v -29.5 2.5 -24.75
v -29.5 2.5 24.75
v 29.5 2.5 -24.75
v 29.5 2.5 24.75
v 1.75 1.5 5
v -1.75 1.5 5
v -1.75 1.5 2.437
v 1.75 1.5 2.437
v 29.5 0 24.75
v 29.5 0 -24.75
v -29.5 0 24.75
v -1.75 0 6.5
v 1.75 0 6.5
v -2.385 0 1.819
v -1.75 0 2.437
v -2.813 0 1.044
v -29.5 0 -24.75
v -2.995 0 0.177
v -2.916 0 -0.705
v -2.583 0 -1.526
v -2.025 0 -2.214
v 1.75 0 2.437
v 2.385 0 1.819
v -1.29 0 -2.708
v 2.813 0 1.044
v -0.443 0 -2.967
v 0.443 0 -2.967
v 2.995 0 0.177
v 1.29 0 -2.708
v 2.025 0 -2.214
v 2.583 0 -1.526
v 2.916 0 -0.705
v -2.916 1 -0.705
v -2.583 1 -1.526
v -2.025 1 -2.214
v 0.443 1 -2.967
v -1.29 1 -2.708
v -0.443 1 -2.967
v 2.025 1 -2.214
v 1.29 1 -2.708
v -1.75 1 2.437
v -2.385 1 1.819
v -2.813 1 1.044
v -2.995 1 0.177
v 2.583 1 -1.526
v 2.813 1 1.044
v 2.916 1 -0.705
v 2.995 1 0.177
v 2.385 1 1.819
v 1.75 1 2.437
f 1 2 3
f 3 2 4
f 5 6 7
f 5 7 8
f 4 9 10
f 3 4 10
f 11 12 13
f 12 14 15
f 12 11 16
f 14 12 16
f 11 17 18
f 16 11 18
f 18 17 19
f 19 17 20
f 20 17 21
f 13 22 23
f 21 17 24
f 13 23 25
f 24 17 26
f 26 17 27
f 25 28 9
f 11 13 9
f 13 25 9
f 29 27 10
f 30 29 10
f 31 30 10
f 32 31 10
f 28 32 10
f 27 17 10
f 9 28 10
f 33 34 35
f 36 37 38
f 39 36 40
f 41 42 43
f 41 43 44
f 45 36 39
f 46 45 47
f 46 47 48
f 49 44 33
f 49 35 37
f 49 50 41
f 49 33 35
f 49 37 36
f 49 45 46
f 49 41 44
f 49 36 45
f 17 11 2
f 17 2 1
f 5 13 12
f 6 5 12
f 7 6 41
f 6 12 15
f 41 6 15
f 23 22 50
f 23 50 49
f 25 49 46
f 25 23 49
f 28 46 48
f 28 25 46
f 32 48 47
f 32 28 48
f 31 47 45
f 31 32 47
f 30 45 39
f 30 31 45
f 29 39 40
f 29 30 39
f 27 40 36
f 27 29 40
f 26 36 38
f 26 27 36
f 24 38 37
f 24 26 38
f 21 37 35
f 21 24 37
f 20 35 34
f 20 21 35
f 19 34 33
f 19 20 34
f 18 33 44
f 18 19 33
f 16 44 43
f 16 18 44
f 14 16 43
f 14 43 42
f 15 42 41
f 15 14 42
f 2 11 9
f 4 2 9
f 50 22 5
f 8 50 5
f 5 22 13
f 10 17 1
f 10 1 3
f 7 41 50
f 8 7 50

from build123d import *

# Parameters (mm, degrees)
SKETCH1_W           = 59
SKETCH1_H           = 49.5
SKETCH1_R           = 3
BOSS_EXTRUDE1_DEPTH = 1.5
BOSS_EXTRUDE2_DEPTH = 49.5
CUT_EXTRUDE1_DEPTH  = 1
CUT_EXTRUDE3_DEPTH  = 65.105869466
BOSS_EXTRUDE3_START = 0.5
SKETCH5_R           = 3
BOSS_EXTRUDE3_DEPTH = 0.5
SKETCH6_W           = 3.5
SKETCH6_H           = 2.563301414
CUT_EXTRUDE4_DEPTH  = 0.5
CHAMFER3_SIZE       = 1.5
SKETCH7_W           = 59
SKETCH7_H           = 2.086537977
CUT_EXTRUDE5_DEPTH  = 58.762444547


with BuildPart() as part:
    # Sketch1 → Boss-Extrude1 (new body)
    with BuildSketch(Plane(origin=(0, 0, 0), x_dir=(1, 0, 0), z_dir=(0, 1, 0))):
        Rectangle(SKETCH1_W, SKETCH1_H)
        with Locations(Location((0, 0, 0), (0, 0, 270))):
            Circle(SKETCH1_R, mode=Mode.SUBTRACT)
    extrude(amount=BOSS_EXTRUDE1_DEPTH)

    # Sketch2 → Boss-Extrude2 (add)
    with BuildSketch(Plane(origin=(0, 0, -24.75), x_dir=(-1, 0, 0), z_dir=(0, 0, -1))):
        Polygon((-29.5, 1.5), (29.5, 1.5), (29.5, 2.5), (28.32, 4), (27.14, 2.5), (25.96, 4), (24.78, 2.5), (23.6, 4), (22.42, 2.5), (21.24, 4), (20.06, 2.5), (18.88, 4), (17.7, 2.5), (16.52, 4), (15.34, 2.5), (14.16, 4), (12.98, 2.5), (11.8, 4), (10.62, 2.5), (9.44, 4), (8.26, 2.5), (7.08, 4), (5.9, 2.5), (4.72, 4), (3.54, 2.5), (2.36, 4), (1.18, 2.5), (0, 4), (-1.18, 2.5), (-2.36, 4), (-3.54, 2.5), (-4.72, 4), (-5.9, 2.5), (-7.08, 4), (-8.26, 2.5), (-9.44, 4), (-10.62, 2.5), (-11.8, 4), (-12.98, 2.5), (-14.16, 4), (-15.34, 2.5), (-16.52, 4), (-17.7, 2.5), (-18.88, 4), (-20.06, 2.5), (-21.24, 4), (-22.42, 2.5), (-23.6, 4), (-24.78, 2.5), (-25.96, 4), (-27.14, 2.5), (-28.32, 4), (-29.5, 2.5), align=None)
    extrude(amount=-BOSS_EXTRUDE2_DEPTH)

    # Sketch3 → Cut-Extrude1 (cut)
    with BuildSketch(Plane(origin=(0, 0, 0), x_dir=(-1, 0, 0), z_dir=(0, -1, 0))):
        with BuildLine():
            Line((-1.75, -2.436698586), (-1.75, -5))
            Line((-1.75, -5), (1.75, -5))
            Line((1.75, -5), (1.75, -2.436698586))
            ThreePointArc((1.75, -2.436698586), (0, 3), (-1.75, -2.436698586))
        make_face()
    extrude(amount=-CUT_EXTRUDE1_DEPTH, mode=Mode.SUBTRACT)

    # Sketch4 → Cut-Extrude3 (cut, through all)
    with BuildSketch(Plane(origin=(29.5, 0, 0), x_dir=(0, 0, -1), z_dir=(1, 0, 0))):
        with BuildLine():
            Line((-24, 4), (-24.75, 4))
            Line((-24.75, 4), (-24.75, 3.25))
            ThreePointArc((-24.75, 3.25), (-24.530330086, 3.780330086), (-24, 4))
        make_face()
    cut_extrude3 = extrude(amount=-CUT_EXTRUDE3_DEPTH, mode=Mode.SUBTRACT)

    # Mirror1: Cut-Extrude3 across plane
    add(cut_extrude3.mirror(Plane.XY), mode=Mode.SUBTRACT)

    # Sketch5 → Boss-Extrude3 (add)
    with BuildSketch(Plane.XZ.offset(-1.5).offset(BOSS_EXTRUDE3_START)):
        Circle(SKETCH5_R)
    extrude(amount=-BOSS_EXTRUDE3_DEPTH)

    # Sketch6 → Cut-Extrude4 (cut)
    with BuildSketch(Plane.XZ.offset(-1)):
        with Locations((0, 3.718349293)):
            Rectangle(SKETCH6_W, SKETCH6_H)
    extrude(amount=-CUT_EXTRUDE4_DEPTH, mode=Mode.SUBTRACT)

    # Chamfer3
    chamfer3_edges = [part.edges().sort_by_distance(p)[0] for p in [
        (0, 0, 5),
    ]]
    chamfer(chamfer3_edges, length=CHAMFER3_SIZE - 0.0001)  # a hair under: the kernel refuses the full size

    # Sketch7 → Cut-Extrude5 (cut, through all)
    with BuildSketch(Plane.XY.offset(24.75)):
        with Locations((0, 3.543268988)):
            Rectangle(SKETCH7_W, SKETCH7_H)
    extrude(amount=-CUT_EXTRUDE5_DEPTH, mode=Mode.SUBTRACT)


solid = part.part
